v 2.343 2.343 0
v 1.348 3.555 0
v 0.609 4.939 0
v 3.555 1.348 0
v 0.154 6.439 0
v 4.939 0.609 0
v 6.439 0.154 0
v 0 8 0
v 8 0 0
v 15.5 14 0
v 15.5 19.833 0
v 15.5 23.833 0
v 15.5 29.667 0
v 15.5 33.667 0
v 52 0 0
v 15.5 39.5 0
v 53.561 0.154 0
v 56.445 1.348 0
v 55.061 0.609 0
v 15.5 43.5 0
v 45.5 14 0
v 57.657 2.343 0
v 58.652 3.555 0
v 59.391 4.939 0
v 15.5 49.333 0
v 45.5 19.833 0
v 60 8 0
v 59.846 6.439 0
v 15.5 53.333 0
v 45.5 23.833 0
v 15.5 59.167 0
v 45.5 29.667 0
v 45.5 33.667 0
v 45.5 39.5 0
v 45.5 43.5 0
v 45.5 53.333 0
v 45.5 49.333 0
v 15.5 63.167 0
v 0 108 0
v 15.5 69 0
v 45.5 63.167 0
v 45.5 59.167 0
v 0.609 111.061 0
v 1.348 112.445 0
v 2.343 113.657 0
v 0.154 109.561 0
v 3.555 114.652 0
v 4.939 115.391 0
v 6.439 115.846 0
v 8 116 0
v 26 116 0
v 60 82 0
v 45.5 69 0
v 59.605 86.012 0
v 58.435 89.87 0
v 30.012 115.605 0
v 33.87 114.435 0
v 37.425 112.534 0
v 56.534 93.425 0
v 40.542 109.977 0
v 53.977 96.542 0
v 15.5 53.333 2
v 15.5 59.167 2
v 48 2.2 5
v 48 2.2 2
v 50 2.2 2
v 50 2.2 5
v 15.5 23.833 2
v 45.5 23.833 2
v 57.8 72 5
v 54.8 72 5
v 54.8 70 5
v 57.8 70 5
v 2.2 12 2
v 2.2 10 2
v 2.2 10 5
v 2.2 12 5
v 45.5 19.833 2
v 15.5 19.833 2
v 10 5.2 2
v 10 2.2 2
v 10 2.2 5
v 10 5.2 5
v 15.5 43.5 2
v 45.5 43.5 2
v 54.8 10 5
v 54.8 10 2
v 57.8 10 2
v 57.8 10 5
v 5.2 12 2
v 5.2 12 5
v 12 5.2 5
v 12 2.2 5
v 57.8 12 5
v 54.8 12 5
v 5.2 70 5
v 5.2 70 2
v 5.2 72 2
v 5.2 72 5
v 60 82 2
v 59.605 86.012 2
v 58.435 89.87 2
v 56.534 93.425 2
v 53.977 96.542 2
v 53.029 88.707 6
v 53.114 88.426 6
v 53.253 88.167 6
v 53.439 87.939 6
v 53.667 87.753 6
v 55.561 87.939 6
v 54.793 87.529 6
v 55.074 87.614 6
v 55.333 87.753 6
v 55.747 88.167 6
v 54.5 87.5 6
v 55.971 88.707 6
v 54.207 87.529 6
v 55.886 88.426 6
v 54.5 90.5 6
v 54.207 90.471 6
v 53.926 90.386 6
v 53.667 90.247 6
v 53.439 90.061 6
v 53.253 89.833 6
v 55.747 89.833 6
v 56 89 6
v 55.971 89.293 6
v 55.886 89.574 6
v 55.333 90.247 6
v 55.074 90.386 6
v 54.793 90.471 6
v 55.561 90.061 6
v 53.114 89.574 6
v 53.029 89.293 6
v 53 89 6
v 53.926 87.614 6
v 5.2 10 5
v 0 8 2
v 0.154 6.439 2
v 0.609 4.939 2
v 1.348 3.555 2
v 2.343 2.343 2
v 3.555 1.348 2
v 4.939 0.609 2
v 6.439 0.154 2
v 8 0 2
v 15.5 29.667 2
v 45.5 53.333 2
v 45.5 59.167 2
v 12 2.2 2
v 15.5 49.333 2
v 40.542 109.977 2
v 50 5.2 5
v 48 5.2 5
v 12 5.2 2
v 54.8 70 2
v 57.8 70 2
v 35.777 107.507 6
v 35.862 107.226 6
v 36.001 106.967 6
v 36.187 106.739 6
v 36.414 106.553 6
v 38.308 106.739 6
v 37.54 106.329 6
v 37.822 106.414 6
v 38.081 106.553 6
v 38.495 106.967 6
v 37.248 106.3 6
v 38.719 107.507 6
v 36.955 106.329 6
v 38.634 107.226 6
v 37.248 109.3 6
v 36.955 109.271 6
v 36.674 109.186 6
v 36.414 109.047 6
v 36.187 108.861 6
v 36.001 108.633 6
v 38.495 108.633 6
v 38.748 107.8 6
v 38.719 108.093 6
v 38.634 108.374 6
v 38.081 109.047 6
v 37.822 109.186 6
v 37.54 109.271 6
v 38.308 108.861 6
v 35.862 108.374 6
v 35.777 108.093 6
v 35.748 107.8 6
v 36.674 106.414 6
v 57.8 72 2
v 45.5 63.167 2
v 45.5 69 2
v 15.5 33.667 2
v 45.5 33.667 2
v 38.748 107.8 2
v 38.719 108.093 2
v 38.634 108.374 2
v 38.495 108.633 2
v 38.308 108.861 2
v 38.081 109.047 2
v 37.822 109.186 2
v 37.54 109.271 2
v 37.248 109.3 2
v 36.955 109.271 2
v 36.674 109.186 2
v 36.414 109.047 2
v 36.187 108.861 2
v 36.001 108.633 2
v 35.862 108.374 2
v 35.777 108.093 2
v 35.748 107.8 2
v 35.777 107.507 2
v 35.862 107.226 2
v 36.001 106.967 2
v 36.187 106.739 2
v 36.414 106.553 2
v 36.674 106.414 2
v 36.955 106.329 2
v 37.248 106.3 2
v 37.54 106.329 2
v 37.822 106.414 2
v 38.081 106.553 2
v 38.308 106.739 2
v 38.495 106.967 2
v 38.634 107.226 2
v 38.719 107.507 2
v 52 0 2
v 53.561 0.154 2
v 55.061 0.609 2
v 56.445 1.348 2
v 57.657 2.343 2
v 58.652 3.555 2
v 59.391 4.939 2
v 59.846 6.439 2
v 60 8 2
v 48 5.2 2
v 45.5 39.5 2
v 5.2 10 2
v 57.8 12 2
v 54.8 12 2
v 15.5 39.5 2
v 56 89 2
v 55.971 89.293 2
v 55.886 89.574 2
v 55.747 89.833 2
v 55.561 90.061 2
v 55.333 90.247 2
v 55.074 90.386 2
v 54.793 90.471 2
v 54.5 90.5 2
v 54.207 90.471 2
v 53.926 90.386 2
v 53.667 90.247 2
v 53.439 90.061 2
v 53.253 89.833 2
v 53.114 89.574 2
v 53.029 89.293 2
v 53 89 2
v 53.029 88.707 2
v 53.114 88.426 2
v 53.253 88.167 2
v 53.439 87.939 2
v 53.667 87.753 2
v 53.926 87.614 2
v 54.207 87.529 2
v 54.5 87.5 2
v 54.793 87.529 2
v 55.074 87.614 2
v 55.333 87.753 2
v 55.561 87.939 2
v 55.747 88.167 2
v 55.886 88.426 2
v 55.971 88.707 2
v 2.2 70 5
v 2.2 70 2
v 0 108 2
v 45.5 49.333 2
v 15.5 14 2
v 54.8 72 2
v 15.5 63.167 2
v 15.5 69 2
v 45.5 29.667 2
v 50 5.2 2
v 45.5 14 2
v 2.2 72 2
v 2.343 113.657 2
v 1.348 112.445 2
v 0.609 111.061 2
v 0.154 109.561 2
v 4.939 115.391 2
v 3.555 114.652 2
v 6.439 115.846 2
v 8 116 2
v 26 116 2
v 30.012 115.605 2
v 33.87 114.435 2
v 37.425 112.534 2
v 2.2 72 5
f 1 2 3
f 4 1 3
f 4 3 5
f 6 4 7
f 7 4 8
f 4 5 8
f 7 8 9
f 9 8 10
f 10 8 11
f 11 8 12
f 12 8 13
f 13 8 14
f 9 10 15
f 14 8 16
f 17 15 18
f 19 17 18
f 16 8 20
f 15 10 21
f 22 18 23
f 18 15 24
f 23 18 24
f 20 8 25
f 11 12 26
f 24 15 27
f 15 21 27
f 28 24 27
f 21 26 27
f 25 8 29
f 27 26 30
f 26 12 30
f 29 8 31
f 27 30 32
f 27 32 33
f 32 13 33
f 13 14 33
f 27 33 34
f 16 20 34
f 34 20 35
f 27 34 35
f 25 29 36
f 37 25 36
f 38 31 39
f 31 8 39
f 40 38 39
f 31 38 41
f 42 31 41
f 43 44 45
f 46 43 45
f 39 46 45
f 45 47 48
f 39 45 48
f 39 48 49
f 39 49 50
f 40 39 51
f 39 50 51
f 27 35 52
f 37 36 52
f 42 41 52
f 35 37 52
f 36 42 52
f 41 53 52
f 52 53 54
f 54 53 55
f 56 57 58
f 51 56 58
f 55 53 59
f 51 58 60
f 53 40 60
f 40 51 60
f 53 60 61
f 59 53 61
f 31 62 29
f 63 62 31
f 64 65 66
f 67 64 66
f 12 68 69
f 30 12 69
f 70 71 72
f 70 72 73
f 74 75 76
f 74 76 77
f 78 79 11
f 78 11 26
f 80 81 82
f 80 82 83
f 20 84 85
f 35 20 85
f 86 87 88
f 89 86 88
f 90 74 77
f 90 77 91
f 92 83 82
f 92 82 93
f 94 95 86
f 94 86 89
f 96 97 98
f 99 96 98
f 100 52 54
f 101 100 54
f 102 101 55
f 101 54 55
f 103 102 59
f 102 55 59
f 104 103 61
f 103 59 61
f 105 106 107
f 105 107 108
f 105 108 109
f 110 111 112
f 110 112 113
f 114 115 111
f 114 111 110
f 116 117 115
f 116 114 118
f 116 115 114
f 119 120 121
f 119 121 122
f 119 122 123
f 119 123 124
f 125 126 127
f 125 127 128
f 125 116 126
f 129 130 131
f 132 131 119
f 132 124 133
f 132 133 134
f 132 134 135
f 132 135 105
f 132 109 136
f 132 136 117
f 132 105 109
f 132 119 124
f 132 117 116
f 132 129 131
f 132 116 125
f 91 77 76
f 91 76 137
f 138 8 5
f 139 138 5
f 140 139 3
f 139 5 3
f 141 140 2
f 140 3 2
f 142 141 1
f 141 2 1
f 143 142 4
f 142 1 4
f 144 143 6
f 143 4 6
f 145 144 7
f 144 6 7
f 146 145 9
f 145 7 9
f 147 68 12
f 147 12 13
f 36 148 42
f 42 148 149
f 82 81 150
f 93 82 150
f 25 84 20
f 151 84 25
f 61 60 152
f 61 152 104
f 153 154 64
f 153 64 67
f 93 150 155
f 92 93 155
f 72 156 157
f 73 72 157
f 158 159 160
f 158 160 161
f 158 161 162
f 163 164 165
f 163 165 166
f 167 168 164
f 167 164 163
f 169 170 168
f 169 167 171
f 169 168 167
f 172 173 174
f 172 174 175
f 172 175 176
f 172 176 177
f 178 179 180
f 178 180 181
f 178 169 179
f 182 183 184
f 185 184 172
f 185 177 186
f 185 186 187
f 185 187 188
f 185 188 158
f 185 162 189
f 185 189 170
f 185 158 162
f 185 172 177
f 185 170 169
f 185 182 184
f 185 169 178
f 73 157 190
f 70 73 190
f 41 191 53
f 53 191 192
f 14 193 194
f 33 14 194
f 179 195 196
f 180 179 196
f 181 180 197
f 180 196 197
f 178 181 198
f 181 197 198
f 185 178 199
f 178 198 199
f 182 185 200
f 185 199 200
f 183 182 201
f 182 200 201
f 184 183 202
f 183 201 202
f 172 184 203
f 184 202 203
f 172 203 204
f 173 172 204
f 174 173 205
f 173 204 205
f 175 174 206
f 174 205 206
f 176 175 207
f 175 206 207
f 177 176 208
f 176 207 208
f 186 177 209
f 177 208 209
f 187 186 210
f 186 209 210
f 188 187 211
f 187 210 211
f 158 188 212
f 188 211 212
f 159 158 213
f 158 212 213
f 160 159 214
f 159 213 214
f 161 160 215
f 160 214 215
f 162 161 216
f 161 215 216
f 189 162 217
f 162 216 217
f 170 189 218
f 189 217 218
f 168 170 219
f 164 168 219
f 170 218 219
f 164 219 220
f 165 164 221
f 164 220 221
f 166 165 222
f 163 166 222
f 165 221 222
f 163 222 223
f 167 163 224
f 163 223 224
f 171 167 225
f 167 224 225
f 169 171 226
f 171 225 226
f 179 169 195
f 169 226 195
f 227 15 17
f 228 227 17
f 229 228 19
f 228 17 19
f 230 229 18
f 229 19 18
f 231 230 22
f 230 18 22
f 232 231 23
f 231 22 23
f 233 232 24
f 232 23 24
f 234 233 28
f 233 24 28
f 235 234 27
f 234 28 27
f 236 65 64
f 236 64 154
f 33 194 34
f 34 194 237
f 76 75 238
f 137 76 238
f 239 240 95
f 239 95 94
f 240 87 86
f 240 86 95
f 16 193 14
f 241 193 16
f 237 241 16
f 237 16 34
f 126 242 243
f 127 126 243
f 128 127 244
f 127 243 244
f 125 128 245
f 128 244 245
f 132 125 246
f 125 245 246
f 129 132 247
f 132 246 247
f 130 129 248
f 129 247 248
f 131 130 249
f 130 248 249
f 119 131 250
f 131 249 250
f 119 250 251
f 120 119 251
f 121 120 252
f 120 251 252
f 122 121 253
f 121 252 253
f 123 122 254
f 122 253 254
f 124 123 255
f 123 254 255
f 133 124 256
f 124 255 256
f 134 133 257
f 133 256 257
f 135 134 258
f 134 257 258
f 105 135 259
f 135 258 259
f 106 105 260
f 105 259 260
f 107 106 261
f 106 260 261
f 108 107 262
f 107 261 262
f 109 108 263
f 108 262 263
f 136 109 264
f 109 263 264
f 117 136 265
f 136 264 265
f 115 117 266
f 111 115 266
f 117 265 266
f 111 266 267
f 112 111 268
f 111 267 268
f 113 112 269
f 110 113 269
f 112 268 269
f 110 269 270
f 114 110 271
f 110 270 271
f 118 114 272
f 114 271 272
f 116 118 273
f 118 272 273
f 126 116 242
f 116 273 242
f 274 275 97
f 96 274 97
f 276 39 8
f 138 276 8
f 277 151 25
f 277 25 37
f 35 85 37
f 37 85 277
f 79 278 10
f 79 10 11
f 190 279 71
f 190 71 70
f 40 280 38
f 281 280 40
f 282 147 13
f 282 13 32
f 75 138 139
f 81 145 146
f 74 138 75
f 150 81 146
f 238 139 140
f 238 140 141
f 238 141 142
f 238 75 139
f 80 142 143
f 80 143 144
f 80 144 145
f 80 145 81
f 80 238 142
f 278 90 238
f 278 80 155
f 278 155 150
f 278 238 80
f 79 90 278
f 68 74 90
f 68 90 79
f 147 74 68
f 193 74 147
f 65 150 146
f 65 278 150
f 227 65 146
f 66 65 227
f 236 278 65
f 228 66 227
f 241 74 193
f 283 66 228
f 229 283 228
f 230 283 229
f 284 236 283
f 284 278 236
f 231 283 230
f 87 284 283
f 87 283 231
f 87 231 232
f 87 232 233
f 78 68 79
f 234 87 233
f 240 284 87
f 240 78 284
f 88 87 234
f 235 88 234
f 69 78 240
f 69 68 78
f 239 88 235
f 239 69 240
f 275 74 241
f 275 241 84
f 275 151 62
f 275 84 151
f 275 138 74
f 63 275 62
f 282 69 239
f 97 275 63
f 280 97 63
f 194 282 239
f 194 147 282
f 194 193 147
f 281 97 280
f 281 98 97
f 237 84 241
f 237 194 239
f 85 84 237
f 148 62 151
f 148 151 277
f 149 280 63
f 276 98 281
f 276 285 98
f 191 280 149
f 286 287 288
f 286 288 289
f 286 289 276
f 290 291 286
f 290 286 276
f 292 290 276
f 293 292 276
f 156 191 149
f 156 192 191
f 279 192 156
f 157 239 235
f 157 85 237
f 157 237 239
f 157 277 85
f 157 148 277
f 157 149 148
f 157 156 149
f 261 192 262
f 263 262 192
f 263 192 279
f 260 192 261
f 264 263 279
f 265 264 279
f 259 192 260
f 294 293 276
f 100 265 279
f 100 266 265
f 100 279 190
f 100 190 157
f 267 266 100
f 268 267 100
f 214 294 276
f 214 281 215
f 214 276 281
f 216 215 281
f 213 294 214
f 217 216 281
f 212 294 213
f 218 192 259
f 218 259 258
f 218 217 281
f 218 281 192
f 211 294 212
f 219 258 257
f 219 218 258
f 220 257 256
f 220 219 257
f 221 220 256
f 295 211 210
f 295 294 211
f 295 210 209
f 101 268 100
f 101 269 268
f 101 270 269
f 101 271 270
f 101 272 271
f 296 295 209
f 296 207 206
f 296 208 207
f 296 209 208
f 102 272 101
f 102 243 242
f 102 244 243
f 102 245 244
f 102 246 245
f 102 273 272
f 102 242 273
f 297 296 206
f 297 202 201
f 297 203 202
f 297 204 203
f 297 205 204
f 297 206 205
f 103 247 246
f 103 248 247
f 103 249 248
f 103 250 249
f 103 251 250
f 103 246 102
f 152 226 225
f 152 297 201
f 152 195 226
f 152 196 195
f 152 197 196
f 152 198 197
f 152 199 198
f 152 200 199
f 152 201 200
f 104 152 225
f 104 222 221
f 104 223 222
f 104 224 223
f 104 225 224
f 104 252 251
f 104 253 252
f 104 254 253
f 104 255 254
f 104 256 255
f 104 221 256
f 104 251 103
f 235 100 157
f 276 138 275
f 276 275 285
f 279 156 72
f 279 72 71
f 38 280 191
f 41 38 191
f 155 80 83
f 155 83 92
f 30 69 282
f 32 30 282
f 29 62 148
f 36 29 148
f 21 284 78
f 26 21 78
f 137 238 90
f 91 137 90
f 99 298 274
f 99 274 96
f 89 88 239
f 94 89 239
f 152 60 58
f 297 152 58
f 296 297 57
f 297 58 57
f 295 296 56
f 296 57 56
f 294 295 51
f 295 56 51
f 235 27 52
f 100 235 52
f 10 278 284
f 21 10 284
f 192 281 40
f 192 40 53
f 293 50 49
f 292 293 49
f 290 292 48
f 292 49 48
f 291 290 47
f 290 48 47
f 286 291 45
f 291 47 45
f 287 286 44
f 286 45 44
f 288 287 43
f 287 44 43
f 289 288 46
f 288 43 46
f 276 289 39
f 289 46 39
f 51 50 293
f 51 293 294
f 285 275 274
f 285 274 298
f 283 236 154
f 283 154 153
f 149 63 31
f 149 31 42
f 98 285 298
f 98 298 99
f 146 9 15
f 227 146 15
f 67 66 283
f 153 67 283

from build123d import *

# Parameters (mm, degrees)
PAD_DEPTH     = 2
SKETCH002_W   = 2
SKETCH002_H   = 3
SKETCH002_W_2 = 3
SKETCH002_H_2 = 2
PAD001_DEPTH  = 3
SKETCH003_W   = 30
SKETCH003_H   = 5.833333
SKETCH003_H_2 = 5.833334
POCKET_DEPTH  = 5
SKETCH004_R   = 1.5
PAD002_DEPTH  = 4


with BuildPart() as part:
    # Sketch → Pad (new body)
    with BuildSketch(Plane.XY):
        with BuildLine():
            Line((60, 8), (60, 82.000001))
            ThreePointArc((60, 82.000001), (58.434586, 89.869877), (53.976662, 96.541638))
            Line((40.541631, 109.976664), (53.976662, 96.541638))
            ThreePointArc((40.541631, 109.976664), (33.869872, 114.434584), (25.999999, 115.999997))
            Line((7.999999, 115.999997), (25.999999, 115.999997))
            ThreePointArc((7.999999, 115.999997), (2.343146, 113.656851), (0, 107.999998))
            Line((0, 107.999998), (0, 8))
            ThreePointArc((0, 8), (2.343146, 2.343146), (8, 0))
            Line((8, 0), (52, 0))
            ThreePointArc((52, 0), (57.656854, 2.343146), (60, 8))
        make_face()
    extrude(amount=PAD_DEPTH)

    # Sketch002 → Pad001 (new body)
    with BuildSketch(Plane.XY.offset(2)):
        with Locations((11, 3.7)):
            Rectangle(SKETCH002_W, SKETCH002_H)
        with Locations((3.7, 11)):
            Rectangle(SKETCH002_W_2, SKETCH002_H_2)
        with Locations((49, 3.7)):
            Rectangle(SKETCH002_W, SKETCH002_H)
        with Locations((56.3, 11)):
            Rectangle(SKETCH002_W_2, SKETCH002_H_2)
        with Locations((56.3, 71)):
            Rectangle(SKETCH002_W_2, SKETCH002_H_2)
        with Locations((3.7, 71)):
            Rectangle(SKETCH002_W_2, SKETCH002_H_2)
    extrude(amount=PAD001_DEPTH)

    # Sketch003 → Pocket (cut)
    with BuildSketch(Plane.XY.offset(2)):
        with Locations((30.5, 66.083333)):
            Rectangle(SKETCH003_W, SKETCH003_H)
        with Locations((30.5, 56.25)):
            Rectangle(SKETCH003_W, SKETCH003_H_2)
        with Locations((30.5, 46.416666)):
            Rectangle(SKETCH003_W, SKETCH003_H)
        with Locations((30.5, 36.583333)):
            Rectangle(SKETCH003_W, SKETCH003_H)
        with Locations((30.5, 26.75)):
            Rectangle(SKETCH003_W, SKETCH003_H_2)
        with Locations((30.5, 16.916666)):
            Rectangle(SKETCH003_W, SKETCH003_H)
    extrude(amount=-POCKET_DEPTH, mode=Mode.SUBTRACT)

    # Sketch004 → Pad002 (new body)
    with BuildSketch(Plane.XY.offset(2)):
        with Locations((37.247765, 107.8)):
            Circle(SKETCH004_R)
        with Locations((54.5, 89)):
            Circle(SKETCH004_R)
    extrude(amount=PAD002_DEPTH)


solid = part.part
